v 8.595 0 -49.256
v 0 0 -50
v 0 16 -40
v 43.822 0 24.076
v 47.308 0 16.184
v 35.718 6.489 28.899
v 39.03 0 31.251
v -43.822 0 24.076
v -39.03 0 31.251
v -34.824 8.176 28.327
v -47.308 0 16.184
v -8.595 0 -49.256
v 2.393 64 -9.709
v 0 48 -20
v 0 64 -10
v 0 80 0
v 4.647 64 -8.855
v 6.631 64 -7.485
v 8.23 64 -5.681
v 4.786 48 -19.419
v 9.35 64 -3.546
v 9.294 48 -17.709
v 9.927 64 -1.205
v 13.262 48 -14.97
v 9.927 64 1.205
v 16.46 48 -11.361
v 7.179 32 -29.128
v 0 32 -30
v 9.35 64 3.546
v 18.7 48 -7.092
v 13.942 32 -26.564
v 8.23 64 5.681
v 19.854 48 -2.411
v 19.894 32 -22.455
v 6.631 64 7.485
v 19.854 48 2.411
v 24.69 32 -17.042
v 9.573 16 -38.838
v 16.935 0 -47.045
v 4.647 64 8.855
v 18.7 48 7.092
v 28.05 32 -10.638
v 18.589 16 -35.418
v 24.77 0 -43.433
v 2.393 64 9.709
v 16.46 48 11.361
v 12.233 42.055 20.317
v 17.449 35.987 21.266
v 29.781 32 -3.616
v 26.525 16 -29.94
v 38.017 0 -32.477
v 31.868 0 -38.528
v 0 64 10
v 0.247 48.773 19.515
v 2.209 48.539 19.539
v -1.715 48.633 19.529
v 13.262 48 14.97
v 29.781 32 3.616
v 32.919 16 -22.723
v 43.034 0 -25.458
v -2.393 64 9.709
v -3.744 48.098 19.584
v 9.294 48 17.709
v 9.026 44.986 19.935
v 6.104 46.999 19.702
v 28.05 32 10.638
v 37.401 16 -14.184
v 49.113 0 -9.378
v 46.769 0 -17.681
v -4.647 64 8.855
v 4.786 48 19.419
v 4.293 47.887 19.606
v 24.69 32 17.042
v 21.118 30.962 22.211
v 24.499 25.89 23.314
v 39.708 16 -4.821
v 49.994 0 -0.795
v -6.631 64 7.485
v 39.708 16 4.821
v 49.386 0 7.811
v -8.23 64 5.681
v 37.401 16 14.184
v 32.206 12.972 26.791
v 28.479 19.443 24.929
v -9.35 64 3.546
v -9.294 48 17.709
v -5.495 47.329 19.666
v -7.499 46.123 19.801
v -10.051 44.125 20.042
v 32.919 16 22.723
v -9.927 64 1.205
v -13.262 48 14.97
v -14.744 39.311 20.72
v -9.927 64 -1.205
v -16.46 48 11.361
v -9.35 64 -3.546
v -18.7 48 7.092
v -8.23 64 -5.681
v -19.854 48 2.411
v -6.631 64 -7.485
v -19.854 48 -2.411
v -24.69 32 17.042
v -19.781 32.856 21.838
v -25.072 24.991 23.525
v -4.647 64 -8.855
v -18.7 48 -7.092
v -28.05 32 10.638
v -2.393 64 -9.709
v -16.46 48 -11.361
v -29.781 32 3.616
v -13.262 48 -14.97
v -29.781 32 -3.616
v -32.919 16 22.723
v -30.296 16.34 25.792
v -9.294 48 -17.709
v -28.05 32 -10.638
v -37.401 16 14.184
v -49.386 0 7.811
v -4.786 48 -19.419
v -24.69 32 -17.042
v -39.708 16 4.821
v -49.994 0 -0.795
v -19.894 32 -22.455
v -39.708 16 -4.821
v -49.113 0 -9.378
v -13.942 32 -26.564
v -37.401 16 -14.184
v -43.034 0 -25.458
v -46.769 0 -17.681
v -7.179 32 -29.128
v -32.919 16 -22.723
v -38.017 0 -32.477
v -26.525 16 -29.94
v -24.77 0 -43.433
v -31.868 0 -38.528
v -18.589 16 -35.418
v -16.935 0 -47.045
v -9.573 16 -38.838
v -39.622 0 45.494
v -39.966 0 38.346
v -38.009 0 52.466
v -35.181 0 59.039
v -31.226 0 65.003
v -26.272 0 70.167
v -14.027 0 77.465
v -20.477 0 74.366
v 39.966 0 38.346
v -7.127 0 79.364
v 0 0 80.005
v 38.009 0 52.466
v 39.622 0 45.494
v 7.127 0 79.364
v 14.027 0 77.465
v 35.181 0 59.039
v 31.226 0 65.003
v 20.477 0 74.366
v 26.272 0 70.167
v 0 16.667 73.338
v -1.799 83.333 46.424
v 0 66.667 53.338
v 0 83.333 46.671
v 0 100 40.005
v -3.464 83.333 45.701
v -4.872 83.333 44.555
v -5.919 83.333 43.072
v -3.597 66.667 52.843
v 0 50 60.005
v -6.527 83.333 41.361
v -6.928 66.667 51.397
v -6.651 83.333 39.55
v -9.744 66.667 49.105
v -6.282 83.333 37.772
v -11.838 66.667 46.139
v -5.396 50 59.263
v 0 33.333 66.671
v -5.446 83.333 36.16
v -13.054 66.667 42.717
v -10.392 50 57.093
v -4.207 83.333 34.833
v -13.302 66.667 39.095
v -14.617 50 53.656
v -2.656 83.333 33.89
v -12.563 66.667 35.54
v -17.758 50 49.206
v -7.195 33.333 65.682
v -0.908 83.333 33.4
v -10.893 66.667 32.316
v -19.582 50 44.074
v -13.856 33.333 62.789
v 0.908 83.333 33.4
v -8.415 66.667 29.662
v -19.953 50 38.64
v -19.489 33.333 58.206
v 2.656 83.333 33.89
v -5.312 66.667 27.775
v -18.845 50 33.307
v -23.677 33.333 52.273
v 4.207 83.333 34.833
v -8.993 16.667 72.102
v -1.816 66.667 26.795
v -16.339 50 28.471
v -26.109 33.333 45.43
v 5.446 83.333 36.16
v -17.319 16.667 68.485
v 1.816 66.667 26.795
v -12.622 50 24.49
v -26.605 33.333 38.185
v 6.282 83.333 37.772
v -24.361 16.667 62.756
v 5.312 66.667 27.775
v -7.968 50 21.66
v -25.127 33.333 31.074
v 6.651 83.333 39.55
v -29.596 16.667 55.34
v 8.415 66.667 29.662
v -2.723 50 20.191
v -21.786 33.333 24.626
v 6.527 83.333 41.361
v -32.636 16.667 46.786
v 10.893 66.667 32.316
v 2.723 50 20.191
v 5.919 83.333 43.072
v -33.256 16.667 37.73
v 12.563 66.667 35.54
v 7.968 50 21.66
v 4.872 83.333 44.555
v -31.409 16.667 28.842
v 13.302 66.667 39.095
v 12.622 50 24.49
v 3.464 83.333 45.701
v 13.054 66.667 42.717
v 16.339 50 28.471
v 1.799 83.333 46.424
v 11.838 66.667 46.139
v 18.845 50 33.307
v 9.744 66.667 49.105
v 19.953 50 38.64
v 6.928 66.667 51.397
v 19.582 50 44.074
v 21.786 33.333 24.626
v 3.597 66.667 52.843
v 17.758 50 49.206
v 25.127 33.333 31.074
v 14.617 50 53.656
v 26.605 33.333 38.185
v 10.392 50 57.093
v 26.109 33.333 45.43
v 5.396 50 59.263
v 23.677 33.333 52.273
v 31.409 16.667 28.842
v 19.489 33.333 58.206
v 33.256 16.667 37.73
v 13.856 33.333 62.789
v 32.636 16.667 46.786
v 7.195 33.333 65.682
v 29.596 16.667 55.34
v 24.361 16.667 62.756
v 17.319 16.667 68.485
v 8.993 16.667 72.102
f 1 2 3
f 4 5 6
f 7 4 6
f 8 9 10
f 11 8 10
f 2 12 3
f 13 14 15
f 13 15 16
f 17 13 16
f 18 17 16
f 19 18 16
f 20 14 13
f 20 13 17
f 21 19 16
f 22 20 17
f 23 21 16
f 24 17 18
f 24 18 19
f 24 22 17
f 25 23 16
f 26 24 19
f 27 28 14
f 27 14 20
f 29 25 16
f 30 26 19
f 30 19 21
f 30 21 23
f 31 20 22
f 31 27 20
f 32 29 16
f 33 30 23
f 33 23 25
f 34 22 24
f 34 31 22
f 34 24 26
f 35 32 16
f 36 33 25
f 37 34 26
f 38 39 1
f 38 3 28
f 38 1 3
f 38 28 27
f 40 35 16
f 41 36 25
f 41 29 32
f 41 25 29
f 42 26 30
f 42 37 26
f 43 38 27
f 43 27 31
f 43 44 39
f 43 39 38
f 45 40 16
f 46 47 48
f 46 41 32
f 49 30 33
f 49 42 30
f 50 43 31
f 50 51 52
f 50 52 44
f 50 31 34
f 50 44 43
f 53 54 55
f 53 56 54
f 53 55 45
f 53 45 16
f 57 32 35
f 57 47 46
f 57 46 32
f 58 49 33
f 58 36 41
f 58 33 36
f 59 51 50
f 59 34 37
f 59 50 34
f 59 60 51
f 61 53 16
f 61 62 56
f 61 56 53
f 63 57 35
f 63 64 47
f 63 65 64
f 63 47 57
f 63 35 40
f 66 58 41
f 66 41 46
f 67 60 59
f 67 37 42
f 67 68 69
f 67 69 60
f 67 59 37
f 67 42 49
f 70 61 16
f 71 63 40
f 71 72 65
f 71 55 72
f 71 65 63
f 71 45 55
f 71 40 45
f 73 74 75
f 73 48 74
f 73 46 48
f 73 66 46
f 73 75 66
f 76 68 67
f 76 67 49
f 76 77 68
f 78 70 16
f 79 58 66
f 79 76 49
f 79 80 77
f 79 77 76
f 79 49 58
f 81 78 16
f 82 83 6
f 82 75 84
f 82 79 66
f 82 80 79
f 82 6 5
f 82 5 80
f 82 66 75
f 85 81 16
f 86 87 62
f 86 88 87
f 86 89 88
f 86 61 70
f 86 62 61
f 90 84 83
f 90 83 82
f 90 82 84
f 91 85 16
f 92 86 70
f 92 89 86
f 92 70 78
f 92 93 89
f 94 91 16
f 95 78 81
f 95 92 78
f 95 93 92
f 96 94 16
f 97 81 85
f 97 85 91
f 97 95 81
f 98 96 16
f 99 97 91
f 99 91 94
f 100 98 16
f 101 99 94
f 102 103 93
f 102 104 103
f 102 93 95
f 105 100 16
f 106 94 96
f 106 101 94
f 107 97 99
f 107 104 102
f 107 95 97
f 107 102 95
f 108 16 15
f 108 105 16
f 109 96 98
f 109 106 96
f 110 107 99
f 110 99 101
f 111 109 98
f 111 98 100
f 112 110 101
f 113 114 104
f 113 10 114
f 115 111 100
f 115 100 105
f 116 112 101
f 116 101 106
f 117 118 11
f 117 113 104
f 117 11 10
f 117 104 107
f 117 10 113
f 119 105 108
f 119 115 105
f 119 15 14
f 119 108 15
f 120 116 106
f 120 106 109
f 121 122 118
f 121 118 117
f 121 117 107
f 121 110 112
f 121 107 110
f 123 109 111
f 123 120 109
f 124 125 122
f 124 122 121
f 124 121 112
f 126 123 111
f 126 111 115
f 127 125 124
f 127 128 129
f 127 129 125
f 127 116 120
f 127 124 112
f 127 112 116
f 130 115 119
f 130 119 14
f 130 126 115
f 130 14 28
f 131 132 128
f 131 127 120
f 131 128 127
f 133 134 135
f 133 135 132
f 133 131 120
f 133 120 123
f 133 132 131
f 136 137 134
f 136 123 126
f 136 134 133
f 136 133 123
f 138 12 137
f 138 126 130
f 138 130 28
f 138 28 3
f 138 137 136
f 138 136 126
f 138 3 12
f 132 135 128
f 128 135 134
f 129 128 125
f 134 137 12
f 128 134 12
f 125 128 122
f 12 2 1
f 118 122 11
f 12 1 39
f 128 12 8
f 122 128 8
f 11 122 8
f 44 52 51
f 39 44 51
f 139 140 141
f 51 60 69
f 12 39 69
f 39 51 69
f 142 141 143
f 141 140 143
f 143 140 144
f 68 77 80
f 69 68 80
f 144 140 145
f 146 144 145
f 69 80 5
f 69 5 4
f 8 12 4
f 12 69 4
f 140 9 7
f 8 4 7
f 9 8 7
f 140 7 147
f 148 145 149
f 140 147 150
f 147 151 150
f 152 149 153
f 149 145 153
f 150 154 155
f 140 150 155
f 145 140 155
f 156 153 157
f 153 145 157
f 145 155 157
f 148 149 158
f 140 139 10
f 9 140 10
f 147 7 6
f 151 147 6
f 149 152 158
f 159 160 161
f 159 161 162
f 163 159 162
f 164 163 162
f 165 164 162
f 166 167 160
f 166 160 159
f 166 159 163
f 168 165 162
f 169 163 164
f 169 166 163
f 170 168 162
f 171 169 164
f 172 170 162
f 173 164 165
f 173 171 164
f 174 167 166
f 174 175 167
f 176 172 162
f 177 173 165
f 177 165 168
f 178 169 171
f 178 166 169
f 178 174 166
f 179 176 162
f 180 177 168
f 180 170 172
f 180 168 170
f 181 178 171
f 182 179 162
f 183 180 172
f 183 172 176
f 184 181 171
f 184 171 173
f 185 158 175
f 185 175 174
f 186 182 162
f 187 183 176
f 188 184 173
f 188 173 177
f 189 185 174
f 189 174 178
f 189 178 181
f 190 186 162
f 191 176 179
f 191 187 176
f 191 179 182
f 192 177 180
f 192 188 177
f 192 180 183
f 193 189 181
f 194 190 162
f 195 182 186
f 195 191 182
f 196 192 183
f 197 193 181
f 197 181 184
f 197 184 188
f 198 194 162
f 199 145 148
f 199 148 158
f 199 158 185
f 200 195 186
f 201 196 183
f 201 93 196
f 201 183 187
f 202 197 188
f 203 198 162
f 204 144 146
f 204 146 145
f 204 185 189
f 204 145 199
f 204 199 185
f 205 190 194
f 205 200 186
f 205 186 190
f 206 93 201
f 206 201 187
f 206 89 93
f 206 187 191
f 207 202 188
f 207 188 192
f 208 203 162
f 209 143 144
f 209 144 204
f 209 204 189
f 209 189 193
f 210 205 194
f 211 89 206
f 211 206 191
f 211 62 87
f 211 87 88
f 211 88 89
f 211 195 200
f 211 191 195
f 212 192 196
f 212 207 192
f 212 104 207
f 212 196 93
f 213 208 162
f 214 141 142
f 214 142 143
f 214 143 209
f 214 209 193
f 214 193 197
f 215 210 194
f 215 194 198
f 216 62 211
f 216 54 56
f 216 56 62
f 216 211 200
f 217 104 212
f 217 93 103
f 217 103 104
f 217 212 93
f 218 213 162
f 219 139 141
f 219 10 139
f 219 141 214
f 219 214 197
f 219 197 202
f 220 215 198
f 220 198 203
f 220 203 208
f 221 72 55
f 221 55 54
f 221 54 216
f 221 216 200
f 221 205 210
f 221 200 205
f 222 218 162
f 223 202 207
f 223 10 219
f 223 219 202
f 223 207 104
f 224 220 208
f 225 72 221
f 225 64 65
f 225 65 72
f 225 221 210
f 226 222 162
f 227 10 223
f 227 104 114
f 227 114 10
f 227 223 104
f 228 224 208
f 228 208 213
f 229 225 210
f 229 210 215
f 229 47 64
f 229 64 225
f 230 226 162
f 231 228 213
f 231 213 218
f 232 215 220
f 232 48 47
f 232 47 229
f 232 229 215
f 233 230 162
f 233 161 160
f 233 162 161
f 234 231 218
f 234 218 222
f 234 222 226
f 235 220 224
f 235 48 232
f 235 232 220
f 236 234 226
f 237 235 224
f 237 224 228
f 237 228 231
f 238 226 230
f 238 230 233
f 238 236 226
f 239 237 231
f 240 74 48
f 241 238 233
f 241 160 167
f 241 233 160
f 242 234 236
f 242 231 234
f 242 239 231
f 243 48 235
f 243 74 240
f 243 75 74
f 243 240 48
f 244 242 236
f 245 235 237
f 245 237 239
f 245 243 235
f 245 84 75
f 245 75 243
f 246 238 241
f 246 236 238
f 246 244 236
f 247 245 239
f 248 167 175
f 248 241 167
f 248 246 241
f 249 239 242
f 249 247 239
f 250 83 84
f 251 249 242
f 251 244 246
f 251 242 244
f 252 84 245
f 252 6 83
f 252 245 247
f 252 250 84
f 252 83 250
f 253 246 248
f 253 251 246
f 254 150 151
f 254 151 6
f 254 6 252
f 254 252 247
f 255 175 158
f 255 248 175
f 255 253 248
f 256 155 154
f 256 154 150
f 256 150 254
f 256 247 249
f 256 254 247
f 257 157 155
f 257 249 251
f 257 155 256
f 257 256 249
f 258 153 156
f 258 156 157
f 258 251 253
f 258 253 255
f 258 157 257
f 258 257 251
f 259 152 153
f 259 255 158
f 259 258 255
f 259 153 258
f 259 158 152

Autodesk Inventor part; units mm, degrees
ref_plane "YZ Plane" through (0, 0, 0) normal (1, 0, 0) x (0, 1, 0)
ref_plane "XZ Plane" through (0, 0, 0) normal (0, 1, 0) x (-1, 0, 0)
ref_plane "XY Plane" through (0, 0, 0) normal (0, 0, 1) x (1, 0, 0)
sketch "Эскиз1" plane through (0, 0, 0) normal (0, 1, 0) x (-1, 0, 0)
  circle A0 centre (0, 0) radius 50
  circle A1 centre (0, 40) radius 40
  line L0 (44.1832, 40) -> (-44.0888, 40)
  line L1 (0.3076, 84.5902) -> (0.3076, -55.7597)
  line L2 (55.3799, 0) -> (-56.0667, 0)
  dimension "d0" = 100
  dimension "d2" = 80
sketch "Эскиз2" plane through (0, 0, 0) normal (1, 0, 0) x (0, 1, 0)
  line L0 (0, 40.0046) -> (100, 40.0046)
  line L1 (0, 40.0046) -> (0, 80.0046)
  line L2 (0, 80.0046) -> (100, 40.0046)
  line L3 (0, 0) -> (80, 0)
  line L4 (0, 0) -> (0, -50)
  line L5 (0, -50) -> (80, 0)
  dimension "d3" = 100
  dimension "d4" = 40
  dimension "d5" = 80
  dimension "d6" = 50
revolve "Вращение1" add sketch "Эскиз2" angle 360 about axis through (0, 0, 40.0046) along (0, 1, 0) contours L1 L2 L0
revolve "Вращение2" add sketch "Эскиз2" angle 360 about axis through (0, 0, 0) along (0, 1, 0) contours L3 L5 L4
ref_plane "РабПлоскость1" through (0, 33.25, 0) normal (0, -1, 0) x (1, 0, 0)
split_face "Разделение1"
split_face "Разделение2"
ref_plane "РабПлоскость2" through (0, 100, 0) normal (0, -1, 0) x (1, 0, 0)
ref_plane "РабПлоскость3" through (0, 80, 0) normal (0, -1, 0) x (1, 0, 0)
